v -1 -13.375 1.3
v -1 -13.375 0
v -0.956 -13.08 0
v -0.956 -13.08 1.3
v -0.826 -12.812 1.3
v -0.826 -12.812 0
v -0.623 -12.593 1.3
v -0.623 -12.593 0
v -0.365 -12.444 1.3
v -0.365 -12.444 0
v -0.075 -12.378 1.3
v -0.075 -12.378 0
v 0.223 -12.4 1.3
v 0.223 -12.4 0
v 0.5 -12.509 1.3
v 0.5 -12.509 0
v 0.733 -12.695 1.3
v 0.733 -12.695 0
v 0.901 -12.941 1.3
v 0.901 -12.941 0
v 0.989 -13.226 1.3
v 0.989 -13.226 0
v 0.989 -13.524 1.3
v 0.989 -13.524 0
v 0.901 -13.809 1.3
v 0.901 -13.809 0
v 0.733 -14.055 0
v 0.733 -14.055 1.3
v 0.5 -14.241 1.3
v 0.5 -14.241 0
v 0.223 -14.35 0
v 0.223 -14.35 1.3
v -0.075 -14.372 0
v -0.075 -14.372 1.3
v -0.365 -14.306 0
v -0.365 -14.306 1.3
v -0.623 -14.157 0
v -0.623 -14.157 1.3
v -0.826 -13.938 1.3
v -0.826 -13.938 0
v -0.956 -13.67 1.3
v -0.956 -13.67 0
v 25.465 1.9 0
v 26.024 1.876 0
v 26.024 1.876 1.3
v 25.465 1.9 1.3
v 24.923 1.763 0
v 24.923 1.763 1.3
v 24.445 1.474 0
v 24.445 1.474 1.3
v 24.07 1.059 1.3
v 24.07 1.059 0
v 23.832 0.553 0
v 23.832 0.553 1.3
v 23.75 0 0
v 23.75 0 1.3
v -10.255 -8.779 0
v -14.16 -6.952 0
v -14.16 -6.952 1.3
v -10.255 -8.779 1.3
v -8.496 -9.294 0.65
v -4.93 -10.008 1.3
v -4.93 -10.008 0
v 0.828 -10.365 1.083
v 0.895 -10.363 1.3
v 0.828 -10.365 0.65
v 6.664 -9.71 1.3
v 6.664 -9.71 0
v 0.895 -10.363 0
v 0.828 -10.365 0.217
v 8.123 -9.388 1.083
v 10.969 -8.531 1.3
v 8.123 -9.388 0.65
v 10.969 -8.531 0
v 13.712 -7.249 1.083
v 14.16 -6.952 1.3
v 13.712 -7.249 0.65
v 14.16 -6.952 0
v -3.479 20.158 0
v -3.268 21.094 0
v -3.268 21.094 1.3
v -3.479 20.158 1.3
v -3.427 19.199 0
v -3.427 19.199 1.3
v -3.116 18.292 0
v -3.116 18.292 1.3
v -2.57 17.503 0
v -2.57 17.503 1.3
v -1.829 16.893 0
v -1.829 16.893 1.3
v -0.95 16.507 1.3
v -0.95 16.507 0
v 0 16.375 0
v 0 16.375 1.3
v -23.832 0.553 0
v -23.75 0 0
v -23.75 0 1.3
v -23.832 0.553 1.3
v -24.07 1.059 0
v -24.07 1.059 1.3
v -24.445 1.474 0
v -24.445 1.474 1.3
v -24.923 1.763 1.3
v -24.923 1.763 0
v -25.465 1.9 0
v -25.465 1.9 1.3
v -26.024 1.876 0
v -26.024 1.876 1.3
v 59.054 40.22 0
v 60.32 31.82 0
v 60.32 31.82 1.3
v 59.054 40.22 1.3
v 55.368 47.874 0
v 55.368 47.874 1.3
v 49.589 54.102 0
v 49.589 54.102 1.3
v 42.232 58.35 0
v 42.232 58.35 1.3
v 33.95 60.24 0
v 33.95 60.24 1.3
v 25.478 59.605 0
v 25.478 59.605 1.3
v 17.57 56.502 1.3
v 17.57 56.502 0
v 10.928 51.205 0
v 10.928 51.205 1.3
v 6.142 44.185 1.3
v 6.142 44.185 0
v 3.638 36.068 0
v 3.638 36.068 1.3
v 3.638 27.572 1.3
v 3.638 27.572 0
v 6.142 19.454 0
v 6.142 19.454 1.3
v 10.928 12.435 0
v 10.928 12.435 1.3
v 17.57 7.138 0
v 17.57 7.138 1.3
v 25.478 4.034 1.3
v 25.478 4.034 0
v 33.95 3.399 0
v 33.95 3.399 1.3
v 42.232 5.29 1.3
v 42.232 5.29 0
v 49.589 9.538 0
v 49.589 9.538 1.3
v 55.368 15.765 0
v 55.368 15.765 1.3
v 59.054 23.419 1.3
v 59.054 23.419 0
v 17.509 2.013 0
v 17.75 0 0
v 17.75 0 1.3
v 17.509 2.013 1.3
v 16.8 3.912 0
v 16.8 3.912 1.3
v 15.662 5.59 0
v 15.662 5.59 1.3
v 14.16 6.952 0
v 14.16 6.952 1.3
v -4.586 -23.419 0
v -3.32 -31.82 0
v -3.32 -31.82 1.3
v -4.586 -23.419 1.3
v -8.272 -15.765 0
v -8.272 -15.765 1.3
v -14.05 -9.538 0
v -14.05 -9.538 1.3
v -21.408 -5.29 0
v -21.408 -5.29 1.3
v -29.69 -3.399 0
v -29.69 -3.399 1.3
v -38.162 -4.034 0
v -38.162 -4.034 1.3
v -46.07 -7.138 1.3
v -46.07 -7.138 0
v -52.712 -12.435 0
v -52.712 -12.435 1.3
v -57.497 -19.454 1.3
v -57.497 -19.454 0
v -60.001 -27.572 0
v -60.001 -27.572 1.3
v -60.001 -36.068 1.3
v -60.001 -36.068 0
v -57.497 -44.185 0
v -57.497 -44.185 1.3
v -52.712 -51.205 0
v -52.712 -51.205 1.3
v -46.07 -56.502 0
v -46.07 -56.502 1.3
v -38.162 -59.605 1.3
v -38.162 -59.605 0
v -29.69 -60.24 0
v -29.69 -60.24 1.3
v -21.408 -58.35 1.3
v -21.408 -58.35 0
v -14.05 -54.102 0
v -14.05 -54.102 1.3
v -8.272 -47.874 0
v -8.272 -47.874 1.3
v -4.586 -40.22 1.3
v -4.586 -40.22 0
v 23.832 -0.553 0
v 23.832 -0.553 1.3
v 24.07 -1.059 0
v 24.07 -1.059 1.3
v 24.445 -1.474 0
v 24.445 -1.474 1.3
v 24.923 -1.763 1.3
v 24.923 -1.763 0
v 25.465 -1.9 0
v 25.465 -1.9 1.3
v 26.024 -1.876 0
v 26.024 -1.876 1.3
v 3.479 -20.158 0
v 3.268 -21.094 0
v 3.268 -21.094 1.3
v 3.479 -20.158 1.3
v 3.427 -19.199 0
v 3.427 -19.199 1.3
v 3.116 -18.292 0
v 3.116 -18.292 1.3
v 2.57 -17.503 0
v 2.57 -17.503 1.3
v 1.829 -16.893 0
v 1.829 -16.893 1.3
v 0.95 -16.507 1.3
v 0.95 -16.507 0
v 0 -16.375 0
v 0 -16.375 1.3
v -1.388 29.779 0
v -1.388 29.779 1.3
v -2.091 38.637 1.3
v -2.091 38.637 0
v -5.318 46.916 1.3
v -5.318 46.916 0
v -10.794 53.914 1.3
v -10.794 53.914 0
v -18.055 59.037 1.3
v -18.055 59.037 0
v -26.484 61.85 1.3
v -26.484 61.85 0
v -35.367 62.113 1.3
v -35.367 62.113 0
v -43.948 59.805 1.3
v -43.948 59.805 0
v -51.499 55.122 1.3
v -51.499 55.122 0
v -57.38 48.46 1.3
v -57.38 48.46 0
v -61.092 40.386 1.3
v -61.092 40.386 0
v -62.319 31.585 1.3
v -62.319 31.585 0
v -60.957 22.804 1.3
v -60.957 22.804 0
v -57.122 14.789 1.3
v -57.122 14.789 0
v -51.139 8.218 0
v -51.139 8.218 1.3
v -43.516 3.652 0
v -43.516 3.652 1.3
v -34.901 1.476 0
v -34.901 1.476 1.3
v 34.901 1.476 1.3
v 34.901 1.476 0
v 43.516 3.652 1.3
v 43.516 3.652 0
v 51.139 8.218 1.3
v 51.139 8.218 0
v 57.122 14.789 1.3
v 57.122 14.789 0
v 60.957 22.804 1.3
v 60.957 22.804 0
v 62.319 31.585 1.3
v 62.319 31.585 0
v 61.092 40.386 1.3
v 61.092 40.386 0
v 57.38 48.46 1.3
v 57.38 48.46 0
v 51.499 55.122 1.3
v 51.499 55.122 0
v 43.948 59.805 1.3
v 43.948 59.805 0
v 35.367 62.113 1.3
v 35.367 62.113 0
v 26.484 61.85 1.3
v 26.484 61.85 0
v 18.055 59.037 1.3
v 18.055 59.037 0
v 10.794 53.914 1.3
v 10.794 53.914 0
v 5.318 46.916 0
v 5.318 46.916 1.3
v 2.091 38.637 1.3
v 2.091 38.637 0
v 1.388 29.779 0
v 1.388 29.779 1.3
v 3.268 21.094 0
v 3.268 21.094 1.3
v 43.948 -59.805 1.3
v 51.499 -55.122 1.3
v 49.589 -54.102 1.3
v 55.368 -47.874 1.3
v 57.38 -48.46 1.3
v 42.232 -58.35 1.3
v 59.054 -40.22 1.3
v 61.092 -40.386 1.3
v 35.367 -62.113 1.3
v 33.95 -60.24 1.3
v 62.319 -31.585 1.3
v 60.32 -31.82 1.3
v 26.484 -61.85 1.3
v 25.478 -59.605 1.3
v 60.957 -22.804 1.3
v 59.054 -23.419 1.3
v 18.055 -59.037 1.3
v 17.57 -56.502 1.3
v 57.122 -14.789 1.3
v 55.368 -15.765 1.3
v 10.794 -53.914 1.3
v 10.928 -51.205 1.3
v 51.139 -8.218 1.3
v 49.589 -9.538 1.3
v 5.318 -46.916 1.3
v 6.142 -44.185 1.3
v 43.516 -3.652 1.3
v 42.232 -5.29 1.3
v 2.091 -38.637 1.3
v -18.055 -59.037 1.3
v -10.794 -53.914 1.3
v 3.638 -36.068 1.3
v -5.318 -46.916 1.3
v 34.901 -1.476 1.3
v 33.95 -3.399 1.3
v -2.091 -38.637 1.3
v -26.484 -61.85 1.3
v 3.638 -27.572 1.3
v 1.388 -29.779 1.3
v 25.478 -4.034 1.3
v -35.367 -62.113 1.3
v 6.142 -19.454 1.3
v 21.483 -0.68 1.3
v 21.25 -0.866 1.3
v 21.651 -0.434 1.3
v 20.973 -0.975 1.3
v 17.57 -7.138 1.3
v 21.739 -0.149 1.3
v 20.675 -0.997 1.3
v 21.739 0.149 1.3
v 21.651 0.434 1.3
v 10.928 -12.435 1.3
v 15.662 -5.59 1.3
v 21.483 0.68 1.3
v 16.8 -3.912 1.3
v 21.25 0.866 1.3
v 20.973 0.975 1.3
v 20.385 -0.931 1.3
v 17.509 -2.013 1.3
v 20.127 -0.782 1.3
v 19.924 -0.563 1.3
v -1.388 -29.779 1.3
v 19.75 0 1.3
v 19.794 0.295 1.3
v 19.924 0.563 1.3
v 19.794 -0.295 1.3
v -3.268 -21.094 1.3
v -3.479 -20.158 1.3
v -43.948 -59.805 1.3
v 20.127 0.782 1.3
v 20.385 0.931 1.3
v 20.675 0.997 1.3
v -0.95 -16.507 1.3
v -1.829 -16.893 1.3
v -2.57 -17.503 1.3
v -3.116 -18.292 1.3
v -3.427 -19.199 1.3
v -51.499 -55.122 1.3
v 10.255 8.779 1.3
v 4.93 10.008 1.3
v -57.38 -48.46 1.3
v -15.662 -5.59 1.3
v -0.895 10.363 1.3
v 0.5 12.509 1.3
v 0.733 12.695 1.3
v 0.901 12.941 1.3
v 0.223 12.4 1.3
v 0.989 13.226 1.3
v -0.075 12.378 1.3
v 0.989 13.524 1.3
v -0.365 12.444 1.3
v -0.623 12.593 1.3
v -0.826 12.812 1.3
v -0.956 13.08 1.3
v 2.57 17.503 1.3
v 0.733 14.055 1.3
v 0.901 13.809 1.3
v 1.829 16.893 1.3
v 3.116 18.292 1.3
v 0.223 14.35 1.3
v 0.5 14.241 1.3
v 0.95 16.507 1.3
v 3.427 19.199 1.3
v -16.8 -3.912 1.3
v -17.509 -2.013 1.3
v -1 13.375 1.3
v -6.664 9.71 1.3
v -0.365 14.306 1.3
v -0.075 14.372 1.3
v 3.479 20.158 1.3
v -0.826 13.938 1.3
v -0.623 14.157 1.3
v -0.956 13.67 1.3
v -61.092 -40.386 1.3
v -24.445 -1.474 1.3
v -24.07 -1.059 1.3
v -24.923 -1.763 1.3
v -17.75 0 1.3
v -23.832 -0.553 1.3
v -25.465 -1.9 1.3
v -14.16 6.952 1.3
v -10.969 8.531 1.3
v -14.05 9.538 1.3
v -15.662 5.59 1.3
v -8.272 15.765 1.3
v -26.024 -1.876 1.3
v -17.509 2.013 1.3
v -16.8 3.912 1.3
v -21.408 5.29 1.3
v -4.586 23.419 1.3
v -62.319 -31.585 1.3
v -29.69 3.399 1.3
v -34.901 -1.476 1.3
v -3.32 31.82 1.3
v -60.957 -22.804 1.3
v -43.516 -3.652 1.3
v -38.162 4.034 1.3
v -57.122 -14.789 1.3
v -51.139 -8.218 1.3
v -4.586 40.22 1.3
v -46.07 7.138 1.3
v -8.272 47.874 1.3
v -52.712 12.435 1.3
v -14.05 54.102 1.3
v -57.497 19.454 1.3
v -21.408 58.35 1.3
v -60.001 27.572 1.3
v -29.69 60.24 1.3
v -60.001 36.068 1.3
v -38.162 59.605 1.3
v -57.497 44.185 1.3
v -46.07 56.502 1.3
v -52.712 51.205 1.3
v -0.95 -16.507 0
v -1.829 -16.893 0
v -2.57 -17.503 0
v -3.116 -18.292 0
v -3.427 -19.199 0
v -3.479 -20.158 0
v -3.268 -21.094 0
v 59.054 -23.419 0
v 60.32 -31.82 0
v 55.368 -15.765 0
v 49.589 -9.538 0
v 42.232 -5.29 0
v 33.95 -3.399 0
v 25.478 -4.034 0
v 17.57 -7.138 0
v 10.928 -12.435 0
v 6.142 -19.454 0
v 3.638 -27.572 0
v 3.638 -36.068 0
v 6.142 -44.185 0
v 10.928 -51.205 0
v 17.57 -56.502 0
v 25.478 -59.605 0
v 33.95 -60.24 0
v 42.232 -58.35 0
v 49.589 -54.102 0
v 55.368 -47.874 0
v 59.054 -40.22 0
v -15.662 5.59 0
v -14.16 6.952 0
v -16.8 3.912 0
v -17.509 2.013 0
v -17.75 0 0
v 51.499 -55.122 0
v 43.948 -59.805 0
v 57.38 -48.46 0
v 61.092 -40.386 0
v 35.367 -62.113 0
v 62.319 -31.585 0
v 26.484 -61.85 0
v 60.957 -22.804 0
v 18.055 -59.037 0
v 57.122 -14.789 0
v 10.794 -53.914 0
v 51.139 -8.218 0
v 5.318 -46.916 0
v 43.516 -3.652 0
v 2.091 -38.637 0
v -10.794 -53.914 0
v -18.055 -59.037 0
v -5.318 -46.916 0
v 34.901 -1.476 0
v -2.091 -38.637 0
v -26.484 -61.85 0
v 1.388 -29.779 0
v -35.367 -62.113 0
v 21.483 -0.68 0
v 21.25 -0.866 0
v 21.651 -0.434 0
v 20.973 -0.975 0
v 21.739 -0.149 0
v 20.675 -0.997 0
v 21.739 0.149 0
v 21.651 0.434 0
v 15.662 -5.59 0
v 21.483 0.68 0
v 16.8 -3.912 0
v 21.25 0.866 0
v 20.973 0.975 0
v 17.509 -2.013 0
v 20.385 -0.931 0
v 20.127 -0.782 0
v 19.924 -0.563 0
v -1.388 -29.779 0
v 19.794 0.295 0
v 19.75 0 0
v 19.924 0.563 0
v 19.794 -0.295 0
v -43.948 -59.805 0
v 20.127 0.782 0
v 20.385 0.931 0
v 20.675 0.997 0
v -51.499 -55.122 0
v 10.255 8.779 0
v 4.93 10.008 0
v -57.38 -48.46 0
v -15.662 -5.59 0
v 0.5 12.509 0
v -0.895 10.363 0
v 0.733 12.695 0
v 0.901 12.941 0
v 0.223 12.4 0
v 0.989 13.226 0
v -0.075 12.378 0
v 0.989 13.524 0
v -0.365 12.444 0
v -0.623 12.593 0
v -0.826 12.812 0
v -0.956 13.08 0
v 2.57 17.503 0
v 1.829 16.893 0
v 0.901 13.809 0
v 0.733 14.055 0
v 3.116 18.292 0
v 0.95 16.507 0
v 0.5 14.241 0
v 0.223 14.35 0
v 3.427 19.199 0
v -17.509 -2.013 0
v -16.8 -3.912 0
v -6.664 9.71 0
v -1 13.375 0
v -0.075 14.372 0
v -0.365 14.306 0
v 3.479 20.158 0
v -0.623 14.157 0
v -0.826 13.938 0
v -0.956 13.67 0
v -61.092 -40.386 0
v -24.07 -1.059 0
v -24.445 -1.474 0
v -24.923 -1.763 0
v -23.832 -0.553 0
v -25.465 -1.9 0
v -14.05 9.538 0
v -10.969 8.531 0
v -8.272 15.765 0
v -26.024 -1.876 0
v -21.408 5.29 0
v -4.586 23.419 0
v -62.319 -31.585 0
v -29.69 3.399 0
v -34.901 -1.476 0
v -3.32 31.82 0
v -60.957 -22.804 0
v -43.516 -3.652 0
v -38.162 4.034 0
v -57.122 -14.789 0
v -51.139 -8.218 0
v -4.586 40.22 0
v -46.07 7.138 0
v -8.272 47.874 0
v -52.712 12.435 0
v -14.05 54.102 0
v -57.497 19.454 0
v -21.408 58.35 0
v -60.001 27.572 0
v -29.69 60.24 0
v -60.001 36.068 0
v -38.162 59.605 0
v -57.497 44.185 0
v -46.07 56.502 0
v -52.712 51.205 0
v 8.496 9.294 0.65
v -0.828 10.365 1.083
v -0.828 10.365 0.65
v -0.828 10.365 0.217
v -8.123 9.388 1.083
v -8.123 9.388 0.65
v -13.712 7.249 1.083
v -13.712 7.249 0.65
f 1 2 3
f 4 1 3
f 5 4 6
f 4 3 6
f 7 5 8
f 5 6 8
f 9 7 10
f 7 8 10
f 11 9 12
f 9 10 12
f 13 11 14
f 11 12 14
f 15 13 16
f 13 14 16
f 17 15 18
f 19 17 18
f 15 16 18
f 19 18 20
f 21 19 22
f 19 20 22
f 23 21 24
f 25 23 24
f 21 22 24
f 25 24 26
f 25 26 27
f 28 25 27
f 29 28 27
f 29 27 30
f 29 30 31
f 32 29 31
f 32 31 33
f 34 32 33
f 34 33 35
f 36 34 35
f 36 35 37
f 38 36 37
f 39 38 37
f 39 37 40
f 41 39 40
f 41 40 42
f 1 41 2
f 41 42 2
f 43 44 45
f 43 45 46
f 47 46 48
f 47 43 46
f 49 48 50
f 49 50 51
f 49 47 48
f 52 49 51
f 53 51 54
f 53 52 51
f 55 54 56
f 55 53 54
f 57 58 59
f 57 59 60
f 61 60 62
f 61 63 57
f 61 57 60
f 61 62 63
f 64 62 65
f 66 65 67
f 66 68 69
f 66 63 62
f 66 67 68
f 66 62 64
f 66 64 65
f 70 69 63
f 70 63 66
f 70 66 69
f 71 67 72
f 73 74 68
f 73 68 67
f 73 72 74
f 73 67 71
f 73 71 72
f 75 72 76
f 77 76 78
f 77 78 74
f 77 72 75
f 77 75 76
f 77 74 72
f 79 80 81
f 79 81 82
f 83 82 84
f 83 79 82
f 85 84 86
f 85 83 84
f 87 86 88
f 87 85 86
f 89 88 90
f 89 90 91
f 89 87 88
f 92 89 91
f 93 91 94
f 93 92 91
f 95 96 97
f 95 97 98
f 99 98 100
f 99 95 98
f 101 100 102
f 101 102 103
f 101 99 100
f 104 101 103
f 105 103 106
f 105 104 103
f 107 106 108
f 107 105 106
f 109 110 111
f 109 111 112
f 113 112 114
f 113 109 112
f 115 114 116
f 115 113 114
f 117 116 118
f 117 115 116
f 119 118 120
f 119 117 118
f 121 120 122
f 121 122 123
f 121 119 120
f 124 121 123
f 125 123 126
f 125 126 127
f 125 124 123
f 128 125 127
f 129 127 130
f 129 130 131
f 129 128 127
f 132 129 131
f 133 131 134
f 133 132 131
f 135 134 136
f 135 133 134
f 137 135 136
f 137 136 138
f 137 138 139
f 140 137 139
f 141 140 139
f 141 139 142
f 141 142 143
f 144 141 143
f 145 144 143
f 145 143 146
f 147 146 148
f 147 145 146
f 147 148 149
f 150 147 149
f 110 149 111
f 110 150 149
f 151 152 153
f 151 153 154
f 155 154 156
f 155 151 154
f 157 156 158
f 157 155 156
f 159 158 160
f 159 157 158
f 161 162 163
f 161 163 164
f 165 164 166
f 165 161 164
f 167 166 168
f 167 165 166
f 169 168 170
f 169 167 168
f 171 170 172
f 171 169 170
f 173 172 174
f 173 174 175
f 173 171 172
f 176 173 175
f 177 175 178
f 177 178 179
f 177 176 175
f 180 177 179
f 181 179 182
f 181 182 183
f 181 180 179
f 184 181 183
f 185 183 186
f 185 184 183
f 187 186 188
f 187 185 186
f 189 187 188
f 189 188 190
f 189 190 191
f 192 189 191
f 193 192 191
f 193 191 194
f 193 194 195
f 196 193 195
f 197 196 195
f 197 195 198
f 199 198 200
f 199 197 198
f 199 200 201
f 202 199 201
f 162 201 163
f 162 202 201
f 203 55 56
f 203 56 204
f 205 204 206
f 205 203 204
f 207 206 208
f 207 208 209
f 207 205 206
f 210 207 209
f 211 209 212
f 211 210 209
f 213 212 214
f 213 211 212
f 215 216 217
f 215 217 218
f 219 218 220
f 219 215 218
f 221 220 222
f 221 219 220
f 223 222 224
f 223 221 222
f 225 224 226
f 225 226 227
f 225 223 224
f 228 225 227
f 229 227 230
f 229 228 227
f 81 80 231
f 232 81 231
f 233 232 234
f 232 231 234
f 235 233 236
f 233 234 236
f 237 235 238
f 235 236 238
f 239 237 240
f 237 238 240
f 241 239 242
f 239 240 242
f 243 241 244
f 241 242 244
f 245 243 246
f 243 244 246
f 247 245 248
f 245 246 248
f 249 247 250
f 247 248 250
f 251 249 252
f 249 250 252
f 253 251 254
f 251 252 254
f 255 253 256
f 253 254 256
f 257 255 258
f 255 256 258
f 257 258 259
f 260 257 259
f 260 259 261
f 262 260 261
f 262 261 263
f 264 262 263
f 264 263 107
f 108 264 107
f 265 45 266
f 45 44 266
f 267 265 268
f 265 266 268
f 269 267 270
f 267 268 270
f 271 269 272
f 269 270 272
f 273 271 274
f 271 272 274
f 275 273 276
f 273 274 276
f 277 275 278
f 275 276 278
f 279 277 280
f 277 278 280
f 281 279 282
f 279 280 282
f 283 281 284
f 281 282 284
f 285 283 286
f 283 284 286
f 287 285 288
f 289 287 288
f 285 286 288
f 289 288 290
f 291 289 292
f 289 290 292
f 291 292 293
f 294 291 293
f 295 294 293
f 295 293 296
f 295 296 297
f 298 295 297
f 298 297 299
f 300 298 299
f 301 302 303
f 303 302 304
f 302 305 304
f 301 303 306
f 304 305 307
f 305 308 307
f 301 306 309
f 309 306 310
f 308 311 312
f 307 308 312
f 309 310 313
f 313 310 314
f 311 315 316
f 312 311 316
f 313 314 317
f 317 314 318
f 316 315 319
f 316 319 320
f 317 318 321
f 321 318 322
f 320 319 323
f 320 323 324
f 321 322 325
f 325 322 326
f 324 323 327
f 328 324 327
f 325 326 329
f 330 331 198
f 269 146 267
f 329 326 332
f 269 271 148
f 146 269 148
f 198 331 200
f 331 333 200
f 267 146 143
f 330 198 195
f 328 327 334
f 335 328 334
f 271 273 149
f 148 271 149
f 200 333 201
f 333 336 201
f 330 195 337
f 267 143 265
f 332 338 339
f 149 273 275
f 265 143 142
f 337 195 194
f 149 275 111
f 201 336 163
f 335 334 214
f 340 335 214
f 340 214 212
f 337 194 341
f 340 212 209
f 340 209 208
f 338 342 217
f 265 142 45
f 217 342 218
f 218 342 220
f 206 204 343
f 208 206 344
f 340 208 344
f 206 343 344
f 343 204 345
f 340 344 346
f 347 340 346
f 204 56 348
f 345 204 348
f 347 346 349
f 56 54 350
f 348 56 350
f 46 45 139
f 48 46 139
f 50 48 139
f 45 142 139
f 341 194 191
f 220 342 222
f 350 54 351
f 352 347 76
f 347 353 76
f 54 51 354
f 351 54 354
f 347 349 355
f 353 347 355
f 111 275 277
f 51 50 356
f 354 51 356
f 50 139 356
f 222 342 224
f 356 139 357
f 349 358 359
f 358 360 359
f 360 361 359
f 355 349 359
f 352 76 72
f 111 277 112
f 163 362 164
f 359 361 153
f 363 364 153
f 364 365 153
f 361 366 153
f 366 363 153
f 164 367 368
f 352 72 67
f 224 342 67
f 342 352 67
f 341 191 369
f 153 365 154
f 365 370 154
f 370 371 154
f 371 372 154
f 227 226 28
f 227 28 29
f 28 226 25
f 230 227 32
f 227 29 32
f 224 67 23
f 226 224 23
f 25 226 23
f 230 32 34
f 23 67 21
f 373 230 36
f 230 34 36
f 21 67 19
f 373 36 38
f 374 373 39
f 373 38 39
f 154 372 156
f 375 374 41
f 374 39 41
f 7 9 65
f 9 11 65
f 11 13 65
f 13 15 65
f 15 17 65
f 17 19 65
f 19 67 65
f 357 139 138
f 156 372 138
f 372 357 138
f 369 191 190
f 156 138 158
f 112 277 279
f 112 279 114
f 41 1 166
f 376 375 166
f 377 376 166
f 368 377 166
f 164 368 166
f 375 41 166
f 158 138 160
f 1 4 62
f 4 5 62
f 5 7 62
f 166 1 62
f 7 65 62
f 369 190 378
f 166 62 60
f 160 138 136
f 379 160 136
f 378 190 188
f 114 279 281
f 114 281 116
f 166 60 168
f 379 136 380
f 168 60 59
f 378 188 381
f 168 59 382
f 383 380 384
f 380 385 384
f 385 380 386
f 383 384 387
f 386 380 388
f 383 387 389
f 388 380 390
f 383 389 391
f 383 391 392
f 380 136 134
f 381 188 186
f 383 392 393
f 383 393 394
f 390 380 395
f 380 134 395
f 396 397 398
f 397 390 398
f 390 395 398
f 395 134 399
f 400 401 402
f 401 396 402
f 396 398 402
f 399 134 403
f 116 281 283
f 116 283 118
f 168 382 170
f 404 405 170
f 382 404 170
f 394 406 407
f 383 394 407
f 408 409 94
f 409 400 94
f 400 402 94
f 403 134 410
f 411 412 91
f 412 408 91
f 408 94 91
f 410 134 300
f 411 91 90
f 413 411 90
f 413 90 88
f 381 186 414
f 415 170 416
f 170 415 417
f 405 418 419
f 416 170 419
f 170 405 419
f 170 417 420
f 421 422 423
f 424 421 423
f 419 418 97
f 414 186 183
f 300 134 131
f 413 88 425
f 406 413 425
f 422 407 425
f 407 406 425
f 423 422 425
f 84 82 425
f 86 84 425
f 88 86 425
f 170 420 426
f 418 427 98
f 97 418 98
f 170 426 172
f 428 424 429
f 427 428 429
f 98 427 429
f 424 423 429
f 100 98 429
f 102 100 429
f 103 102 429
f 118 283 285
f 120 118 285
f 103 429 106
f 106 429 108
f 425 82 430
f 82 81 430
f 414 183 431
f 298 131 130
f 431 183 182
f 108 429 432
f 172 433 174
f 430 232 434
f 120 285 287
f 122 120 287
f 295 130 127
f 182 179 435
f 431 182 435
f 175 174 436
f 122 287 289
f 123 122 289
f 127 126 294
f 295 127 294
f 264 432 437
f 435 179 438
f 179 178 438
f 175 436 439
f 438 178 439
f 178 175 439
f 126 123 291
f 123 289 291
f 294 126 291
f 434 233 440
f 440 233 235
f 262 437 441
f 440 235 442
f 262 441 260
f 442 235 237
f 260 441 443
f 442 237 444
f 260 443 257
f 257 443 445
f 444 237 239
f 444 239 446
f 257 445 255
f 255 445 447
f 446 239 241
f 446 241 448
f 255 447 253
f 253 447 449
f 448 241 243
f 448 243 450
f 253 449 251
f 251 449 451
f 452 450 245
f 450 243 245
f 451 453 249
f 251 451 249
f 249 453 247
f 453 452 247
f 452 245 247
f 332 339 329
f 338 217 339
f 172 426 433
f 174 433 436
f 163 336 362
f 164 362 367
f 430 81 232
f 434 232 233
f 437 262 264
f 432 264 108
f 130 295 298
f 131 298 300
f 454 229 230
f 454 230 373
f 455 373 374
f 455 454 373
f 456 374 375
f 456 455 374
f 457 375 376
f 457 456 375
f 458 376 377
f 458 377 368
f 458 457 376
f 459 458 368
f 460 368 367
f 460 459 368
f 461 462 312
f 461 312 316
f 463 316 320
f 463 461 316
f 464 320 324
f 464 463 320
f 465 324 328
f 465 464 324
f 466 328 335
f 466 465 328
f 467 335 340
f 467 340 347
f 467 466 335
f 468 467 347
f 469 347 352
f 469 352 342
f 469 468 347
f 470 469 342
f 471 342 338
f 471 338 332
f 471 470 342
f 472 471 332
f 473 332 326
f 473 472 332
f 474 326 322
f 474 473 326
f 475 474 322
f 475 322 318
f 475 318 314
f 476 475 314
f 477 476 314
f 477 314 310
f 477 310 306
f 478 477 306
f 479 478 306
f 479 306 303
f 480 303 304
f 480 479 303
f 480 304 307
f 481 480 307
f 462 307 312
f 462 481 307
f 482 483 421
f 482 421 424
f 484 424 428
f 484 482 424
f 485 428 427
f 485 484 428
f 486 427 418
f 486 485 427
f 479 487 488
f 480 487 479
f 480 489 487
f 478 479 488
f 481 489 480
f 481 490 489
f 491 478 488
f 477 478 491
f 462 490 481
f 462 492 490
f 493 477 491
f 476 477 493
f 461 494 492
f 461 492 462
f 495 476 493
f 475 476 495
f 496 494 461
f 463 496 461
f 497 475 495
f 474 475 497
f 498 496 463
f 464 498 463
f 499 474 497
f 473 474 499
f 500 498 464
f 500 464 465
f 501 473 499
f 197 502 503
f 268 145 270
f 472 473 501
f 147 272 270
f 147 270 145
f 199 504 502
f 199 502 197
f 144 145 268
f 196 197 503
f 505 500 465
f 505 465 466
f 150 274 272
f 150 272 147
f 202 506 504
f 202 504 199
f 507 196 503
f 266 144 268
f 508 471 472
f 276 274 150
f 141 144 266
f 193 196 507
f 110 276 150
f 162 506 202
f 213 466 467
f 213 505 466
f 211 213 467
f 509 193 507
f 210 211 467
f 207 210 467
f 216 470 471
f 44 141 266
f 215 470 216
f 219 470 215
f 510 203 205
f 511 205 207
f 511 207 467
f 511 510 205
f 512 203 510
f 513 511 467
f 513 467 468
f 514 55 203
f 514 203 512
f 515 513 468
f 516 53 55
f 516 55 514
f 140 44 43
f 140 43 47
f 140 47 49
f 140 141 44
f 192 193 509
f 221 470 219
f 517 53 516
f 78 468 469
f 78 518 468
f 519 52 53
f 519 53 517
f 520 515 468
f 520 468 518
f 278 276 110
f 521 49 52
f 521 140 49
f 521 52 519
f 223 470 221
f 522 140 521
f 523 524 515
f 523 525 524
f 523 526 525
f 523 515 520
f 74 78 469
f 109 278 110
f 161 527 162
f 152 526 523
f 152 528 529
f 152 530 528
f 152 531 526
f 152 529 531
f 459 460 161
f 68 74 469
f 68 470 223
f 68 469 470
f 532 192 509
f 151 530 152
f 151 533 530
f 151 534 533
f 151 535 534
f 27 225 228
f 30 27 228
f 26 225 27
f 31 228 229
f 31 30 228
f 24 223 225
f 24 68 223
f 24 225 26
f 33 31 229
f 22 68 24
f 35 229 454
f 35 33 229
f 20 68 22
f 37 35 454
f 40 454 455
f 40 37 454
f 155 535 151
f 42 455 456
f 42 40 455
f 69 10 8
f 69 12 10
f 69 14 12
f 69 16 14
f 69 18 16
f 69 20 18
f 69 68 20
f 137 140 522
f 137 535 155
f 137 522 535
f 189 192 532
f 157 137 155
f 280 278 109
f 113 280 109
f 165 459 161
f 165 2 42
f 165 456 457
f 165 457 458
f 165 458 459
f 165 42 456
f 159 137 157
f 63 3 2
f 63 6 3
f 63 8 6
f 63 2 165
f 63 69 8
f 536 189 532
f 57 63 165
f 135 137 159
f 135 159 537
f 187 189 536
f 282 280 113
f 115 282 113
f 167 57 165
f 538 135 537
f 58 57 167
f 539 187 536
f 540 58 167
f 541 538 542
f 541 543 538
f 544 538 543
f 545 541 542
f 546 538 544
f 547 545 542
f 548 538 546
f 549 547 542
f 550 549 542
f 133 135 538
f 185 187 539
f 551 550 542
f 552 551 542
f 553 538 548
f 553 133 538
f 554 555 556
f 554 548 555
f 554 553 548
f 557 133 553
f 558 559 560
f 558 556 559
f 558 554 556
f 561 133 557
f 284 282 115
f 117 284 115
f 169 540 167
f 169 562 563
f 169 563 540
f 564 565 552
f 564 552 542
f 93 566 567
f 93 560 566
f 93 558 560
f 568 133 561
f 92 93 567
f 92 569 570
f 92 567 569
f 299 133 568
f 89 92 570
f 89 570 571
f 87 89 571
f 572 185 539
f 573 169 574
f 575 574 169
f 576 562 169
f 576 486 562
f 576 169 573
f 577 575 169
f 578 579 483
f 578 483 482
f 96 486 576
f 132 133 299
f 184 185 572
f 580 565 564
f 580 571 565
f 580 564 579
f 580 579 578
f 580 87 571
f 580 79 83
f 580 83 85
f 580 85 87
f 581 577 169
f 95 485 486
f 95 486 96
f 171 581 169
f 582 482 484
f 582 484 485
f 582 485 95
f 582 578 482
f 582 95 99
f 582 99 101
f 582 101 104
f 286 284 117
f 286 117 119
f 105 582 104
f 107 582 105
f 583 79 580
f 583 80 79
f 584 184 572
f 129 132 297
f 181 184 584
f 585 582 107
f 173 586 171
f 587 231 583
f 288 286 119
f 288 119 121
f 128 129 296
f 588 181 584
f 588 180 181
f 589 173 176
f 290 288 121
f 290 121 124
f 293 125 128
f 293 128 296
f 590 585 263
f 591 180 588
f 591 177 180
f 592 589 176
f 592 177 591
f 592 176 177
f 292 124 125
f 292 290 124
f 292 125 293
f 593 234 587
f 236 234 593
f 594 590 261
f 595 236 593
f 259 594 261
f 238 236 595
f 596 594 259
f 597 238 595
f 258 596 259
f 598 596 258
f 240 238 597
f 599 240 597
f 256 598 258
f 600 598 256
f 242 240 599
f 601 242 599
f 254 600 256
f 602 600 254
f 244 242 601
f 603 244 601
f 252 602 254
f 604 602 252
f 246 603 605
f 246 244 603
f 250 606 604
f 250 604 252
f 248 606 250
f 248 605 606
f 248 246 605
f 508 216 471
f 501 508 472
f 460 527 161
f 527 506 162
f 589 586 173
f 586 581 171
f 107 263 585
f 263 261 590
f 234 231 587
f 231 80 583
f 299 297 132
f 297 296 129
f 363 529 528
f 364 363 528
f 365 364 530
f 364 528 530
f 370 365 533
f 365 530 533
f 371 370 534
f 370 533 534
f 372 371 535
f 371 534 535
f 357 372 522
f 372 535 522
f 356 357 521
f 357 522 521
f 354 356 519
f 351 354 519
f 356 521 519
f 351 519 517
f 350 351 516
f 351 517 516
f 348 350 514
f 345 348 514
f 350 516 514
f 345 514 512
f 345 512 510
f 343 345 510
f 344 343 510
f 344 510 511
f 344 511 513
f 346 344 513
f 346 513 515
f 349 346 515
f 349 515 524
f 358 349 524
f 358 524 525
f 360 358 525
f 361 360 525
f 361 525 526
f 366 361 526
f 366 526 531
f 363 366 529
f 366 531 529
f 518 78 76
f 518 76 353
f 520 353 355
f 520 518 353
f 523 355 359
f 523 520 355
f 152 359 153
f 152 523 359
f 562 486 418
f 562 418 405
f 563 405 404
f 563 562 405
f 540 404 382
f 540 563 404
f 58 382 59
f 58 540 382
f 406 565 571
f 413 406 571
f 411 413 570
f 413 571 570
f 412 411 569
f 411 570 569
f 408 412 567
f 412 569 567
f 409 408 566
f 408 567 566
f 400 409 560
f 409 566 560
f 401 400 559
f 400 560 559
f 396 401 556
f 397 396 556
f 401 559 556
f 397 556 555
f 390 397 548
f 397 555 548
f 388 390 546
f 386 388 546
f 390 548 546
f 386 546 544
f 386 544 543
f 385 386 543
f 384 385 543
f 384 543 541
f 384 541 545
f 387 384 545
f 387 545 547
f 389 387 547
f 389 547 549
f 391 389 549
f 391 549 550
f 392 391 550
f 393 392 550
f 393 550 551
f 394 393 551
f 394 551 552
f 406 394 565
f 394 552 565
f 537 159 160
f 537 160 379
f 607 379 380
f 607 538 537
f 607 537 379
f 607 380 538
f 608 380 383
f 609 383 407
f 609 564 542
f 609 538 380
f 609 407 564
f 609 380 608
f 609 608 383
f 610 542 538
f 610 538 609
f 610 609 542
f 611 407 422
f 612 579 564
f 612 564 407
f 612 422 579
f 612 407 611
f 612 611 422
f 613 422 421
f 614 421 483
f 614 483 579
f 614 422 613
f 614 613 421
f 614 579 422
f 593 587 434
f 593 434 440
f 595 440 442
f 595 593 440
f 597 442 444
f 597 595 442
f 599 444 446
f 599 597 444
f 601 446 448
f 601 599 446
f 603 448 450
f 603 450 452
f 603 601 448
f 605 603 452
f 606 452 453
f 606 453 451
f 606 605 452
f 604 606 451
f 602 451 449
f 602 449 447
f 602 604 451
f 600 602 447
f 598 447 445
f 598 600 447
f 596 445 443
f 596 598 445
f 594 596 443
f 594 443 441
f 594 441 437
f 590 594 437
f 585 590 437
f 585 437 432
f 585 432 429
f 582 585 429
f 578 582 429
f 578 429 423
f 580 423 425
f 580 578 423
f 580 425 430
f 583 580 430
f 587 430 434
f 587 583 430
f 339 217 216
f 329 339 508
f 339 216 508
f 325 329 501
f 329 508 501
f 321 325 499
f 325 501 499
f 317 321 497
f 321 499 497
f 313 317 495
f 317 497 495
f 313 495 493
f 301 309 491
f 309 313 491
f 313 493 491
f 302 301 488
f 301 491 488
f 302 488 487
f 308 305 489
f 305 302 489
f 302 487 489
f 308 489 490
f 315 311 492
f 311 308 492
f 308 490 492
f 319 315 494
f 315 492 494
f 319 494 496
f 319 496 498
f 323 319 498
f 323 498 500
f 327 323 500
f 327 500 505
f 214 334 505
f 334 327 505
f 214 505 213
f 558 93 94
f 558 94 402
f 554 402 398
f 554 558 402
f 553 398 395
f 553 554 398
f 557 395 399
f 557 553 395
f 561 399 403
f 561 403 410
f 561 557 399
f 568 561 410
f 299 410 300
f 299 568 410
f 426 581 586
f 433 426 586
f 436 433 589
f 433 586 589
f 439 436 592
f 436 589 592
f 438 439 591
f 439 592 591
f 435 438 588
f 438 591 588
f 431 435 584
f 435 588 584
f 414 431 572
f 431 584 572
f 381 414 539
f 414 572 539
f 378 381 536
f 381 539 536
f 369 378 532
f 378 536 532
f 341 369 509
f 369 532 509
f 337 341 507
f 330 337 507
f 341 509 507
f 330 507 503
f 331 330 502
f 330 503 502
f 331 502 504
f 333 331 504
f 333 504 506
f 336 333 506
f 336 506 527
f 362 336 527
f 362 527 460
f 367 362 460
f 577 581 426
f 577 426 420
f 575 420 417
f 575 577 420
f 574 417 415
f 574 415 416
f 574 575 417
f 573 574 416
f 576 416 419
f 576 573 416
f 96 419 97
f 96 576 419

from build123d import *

# Parameters (mm, degrees)
SKETCH1_R             = 30.5
SKETCH1_R_2           = 28.5
BOSS_EXTRUDE1_DEPTH   = 1.3
BOSS_EXTRUDE1_2_DEPTH = 1.3
BOSS_EXTRUDE1_3_DEPTH = 1.3
BOSS_EXTRUDE1_4_DEPTH = 1.3
SKETCH3_R             = 1
BOSS_EXTRUDE2_DEPTH   = 1.3


with BuildPart() as part:
    # Sketch1 → Boss-Extrude1 (new body)
    with BuildSketch(Plane.XY):
        with Locations((-31.819805153, 31.819805153)):
            Circle(SKETCH1_R)
        with Locations((-31.819805153, 31.819805153)):
            Circle(SKETCH1_R_2, mode=Mode.SUBTRACT)
    extrude(amount=BOSS_EXTRUDE1_DEPTH)



with BuildPart() as body_2:
    # Sketch1 → Boss-Extrude1 2 (new body)
    with BuildSketch(Plane.XY):
        with Locations((31.819805153, 31.819805153)):
            Circle(SKETCH1_R)
        with Locations((31.819805153, 31.819805153)):
            Circle(SKETCH1_R_2, mode=Mode.SUBTRACT)
    extrude(amount=BOSS_EXTRUDE1_2_DEPTH)


with BuildPart() as body_3:
    # Sketch1 → Boss-Extrude1 3 (new body)
    with BuildSketch(Plane.XY):
        with Locations((31.819805153, -31.819805153)):
            Circle(SKETCH1_R)
        with Locations((31.819805153, -31.819805153)):
            Circle(SKETCH1_R_2, mode=Mode.SUBTRACT)
    extrude(amount=BOSS_EXTRUDE1_3_DEPTH)


with BuildPart() as body_4:
    # Sketch1 → Boss-Extrude1 4 (new body)
    with BuildSketch(Plane.XY):
        with Locations((-31.819805153, -31.819805153)):
            Circle(SKETCH1_R)
        with Locations((-31.819805153, -31.819805153)):
            Circle(SKETCH1_R_2, mode=Mode.SUBTRACT)
    extrude(amount=BOSS_EXTRUDE1_4_DEPTH)


with BuildPart() as part_1:
    add(part.part)

    add(body_2.part)  # Boss-Extrude2 merges body 2

    add(body_3.part)  # Boss-Extrude2 merges body 3

    add(body_4.part)  # Boss-Extrude2 merges body 4
    # Sketch3 → Boss-Extrude2 (add)
    with BuildSketch(Plane(origin=(0, 0, 0), x_dir=(-1, 0, 0), z_dir=(0, 0, -1))):
        with BuildLine():
            ThreePointArc((-23.75, 0), (-20.75, -3), (-17.75, 0))
            ThreePointArc((-17.75, 0), (-20.75, 3), (-23.75, 0))
        make_face()
        with Locations((-20.75, 0)):
            Circle(SKETCH3_R, mode=Mode.SUBTRACT)
        with BuildLine():
            ThreePointArc((-14.160081763, -6.952473777), (-16.799552066, -3.912301259), (-17.75, 0))
            ThreePointArc((-17.75, 0), (-20.75, -3), (-23.75, 0))
            ThreePointArc((-23.75, 0), (-24.444680466, -1.473679275), (-26.023521849, -1.875638779))
            ThreePointArc((-26.023521849, -1.875638779), (-19.820237414, -3.779470382), (-14.160081763, -6.952473777))
        make_face()
        with BuildLine():
            ThreePointArc((-23.75, 0), (-20.75, 3), (-17.75, 0))
            ThreePointArc((-17.75, 0), (-16.799552066, 3.912301259), (-14.160081763, 6.952473777))
            ThreePointArc((-14.160081763, 6.952473777), (-19.820237414, 3.779470382), (-26.023521849, 1.875638779))
            ThreePointArc((-26.023521849, 1.875638779), (-24.444680466, 1.473679275), (-23.75, 0))
        make_face()
        with BuildLine():
            add(Edge.make_bspline(
                [(-14.160081763, -6.952473777), (-14.006442935, -7.061581552), (-11.281305453, -8.851296282), (-5.533016891, -10.311083757), (-0.273902085, -10.375), (0, -10.375)],
                knots=[0, 0, 0, 0, 0.05, 0.95, 1, 1, 1, 1], degree=3))
            ThreePointArc((-14.160081763, -6.952473777), (-7.656423025, -13.208492354), (-3.268059498, -21.093770469))
            ThreePointArc((-3.268059498, -21.093770469), (-2.8699742, -17.878412259), (0, -16.375))
            ThreePointArc((0, -16.375), (-3, -13.375), (0, -10.375))
        make_face()
        with BuildLine():
            ThreePointArc((-3.268059498, 21.093770469), (-7.656423025, 13.208492354), (-14.160081763, 6.952473777))
            add(Edge.make_bspline(
                [(-14.160081763, 6.952473777), (-14.006442935, 7.061581552), (-11.281305453, 8.851296282), (-5.533016891, 10.311083757), (-0.273902085, 10.375), (0, 10.375)],
                knots=[0, 0, 0, 0, 0.05, 0.95, 1, 1, 1, 1], degree=3))
            ThreePointArc((0, 10.375), (-3, 13.375), (0, 16.375))
            ThreePointArc((0, 16.375), (-2.8699742, 17.878412259), (-3.268059498, 21.093770469))
        make_face()
        with BuildLine():
            add(Edge.make_bspline(
                [(14.160081763, -6.952473777), (14.006442935, -7.061581552), (11.281305453, -8.851296282), (5.533016891, -10.311083757), (0.273902085, -10.375), (0, -10.375)],
                knots=[0, 0, 0, 0, 0.05, 0.95, 1, 1, 1, 1], degree=3))
            ThreePointArc((0, -10.375), (2.121320344, -11.253679656), (3, -13.375))
            ThreePointArc((3, -13.375), (2.121320344, -15.496320344), (0, -16.375))
            ThreePointArc((0, -16.375), (2.8699742, -17.878412259), (3.268059498, -21.093770469))
            ThreePointArc((3.268059498, -21.093770469), (7.656423025, -13.208492354), (14.160081763, -6.952473777))
        make_face()
        with BuildLine():
            ThreePointArc((3, -13.375), (2.121320344, -11.253679656), (0, -10.375))
            ThreePointArc((0, -10.375), (-3, -13.375), (0, -16.375))
            ThreePointArc((0, -16.375), (2.121320344, -15.496320344), (3, -13.375))
        make_face()
        with Locations((0, -13.375)):
            Circle(SKETCH3_R, mode=Mode.SUBTRACT)
        with BuildLine():
            ThreePointArc((0, 16.375), (-3, 13.375), (0, 10.375))
            ThreePointArc((0, 10.375), (2.121320344, 11.253679656), (3, 13.375))
            ThreePointArc((3, 13.375), (2.121320344, 15.496320344), (0, 16.375))
        make_face()
        with Locations((0, 13.375)):
            Circle(SKETCH3_R, mode=Mode.SUBTRACT)
        with BuildLine():
            ThreePointArc((3, 13.375), (2.121320344, 11.253679656), (0, 10.375))
            add(Edge.make_bspline(
                [(14.160081763, 6.952473777), (14.006442935, 7.061581552), (11.281305453, 8.851296282), (5.533016891, 10.311083757), (0.273902085, 10.375), (0, 10.375)],
                knots=[0, 0, 0, 0, 0.05, 0.95, 1, 1, 1, 1], degree=3))
            ThreePointArc((14.160081763, 6.952473777), (7.656423025, 13.208492354), (3.268059498, 21.093770469))
            ThreePointArc((3.268059498, 21.093770469), (2.8699742, 17.878412259), (0, 16.375))
            ThreePointArc((0, 16.375), (2.121320344, 15.496320344), (3, 13.375))
        make_face()
        with BuildLine():
            ThreePointArc((17.75, 0), (16.799552066, -3.912301259), (14.160081763, -6.952473777))
            ThreePointArc((14.160081763, -6.952473777), (19.820237414, -3.779470382), (26.023521849, -1.875638779))
            ThreePointArc((26.023521849, -1.875638779), (24.444680466, -1.473679275), (23.75, 0))
            ThreePointArc((23.75, 0), (24.444680466, 1.473679275), (26.023521849, 1.875638779))
            ThreePointArc((26.023521849, 1.875638779), (19.820237414, 3.779470382), (14.160081763, 6.952473777))
            ThreePointArc((14.160081763, 6.952473777), (16.799552066, 3.912301259), (17.75, 0))
        make_face()
        with Locations((20.75, 0)):
            Circle(SKETCH3_R, mode=Mode.SUBTRACT)
        with Locations((20.75, 0)):
            Circle(SKETCH3_R)
    extrude(amount=-BOSS_EXTRUDE2_DEPTH)


solid = part_1.part
